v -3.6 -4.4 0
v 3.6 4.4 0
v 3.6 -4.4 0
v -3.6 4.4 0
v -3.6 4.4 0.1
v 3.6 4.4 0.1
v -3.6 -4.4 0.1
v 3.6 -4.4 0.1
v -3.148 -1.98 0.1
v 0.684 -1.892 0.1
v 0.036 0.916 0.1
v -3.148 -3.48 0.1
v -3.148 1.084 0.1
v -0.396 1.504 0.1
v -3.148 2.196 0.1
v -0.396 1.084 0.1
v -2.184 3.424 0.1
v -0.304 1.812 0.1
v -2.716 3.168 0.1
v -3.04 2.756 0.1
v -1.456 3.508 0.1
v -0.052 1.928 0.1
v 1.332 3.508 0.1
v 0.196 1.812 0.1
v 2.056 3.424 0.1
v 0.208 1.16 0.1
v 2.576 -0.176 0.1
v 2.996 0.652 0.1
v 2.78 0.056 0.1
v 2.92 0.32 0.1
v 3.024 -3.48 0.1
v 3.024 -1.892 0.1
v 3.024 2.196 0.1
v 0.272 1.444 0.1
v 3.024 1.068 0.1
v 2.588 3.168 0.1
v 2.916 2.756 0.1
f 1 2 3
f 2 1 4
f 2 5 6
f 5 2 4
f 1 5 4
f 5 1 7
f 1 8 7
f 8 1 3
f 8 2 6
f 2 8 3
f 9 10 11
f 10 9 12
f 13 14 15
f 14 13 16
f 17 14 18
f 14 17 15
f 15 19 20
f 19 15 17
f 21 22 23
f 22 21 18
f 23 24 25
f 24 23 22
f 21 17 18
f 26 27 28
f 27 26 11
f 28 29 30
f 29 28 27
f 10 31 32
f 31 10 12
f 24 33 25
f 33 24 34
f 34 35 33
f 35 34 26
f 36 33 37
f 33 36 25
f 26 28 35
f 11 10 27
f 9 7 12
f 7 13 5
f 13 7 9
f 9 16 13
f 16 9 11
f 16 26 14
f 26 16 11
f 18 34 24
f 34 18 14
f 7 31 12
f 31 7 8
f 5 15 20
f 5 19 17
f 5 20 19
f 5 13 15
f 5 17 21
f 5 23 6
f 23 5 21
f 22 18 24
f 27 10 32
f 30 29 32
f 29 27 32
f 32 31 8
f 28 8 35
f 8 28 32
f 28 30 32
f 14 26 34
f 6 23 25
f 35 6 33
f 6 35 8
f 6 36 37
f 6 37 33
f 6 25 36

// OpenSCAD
// file: ../p/box5-12.scad
use <../lib.scad>
function ldraw_lib__box5_12() = [
// 0 Box with 5 Faces without Any Edges
// 0 Name: box5-12.dat
// 0 Author: Chris Dee [cwdee]
// 0 !LDRAW_ORG Primitive UPDATE 2009-02
// 0 !LICENSE Licensed under CC BY 2.0 and CC BY 4.0 : see CAreadme.txt
// 
// 0 BFC CERTIFY CCW
  [0,"BFC","CERTIFY"],
  [0,"BFC","CCW"],
// 
// 0 !HISTORY 2009-09-03 [PTadmin] Official Update 2009-02
// 
// 
// 4 16 1 1 1 1 1 -1 -1 1 -1 -1 1 1
  [4,16,1,1,1,1,1,-1,-1,1,-1,-1,1,1],
// 4 16 -1 0 1 1 0 1 1 1 1 -1 1 1
  [4,16,-1,0,1,1,0,1,1,1,1,-1,1,1],
// 4 16 -1 0 -1 -1 0 1 -1 1 1 -1 1 -1
  [4,16,-1,0,-1,-1,0,1,-1,1,1,-1,1,-1],
// 4 16 1 0 -1 -1 0 -1 -1 1 -1 1 1 -1
  [4,16,1,0,-1,-1,0,-1,-1,1,-1,1,1,-1],
// 4 16 1 0 1 1 0 -1 1 1 -1 1 1 1
  [4,16,1,0,1,1,0,-1,1,1,-1,1,1,1],
// 0
];
module ldraw_lib__box5_12(step=0, col=false, unit=2/5, alt=false, line=0.2, solid=!$preview)
    makepoly(ldraw_lib__box5_12(), step=step, col=col, unit=unit, alt=alt, line=line, solid=solid);
ldraw_lib__box5_12(line=0.2);
// main file
use <../lib.scad>
use <../p/box5-12.scad>
function ldraw_lib__820673o() = [
// 0 Sticker  1.1 x  0.9 with Black Bold "2" on White Background
// 0 Name: 820673o.dat
// 0 Author: Takeshi Takahashi [RainbowDolphin]
// 0 !LDRAW_ORG Part UPDATE 2022-06
// 0 !LICENSE Licensed under CC BY 2.0 and CC BY 4.0 : see CAreadme.txt
// 
// 0 BFC CERTIFY CCW
  [0,"BFC","CERTIFY"],
  [0,"BFC","CCW"],
// 
// 0 !KEYWORDS Bricklink 6542stk01, Brickowl 602283, harbour, Pier
// 0 !KEYWORDS Rebrickable 820673, Seaport, Set 6542, wharf
// 
// 0 !HISTORY 2022-12-20 [PTadmin] Official Update 2022-06
// 
// 
// 1 16 0 -0.25 0 9 0 0 0 0.25 0 0 0 11 box5-12.dat
  [1,16,0,-0.25,0,9,0,0,0,0.25,0,0,0,11, ldraw_lib__box5_12()],
// 4 0 1.71 -0.25 -4.73 0.09 -0.25 2.29 -7.87 -0.25 -4.95 -7.87 -0.25 -8.7
  [4,0,1.71,-0.25,-4.73,0.09,-0.25,2.29,-7.87,-0.25,-4.95,-7.87,-0.25,-8.7],
// 4 0 -0.99 -0.25 3.76 -7.87 -0.25 5.49 -7.87 -0.25 2.71 -0.99 -0.25 2.71
  [4,0,-0.99,-0.25,3.76,-7.87,-0.25,5.49,-7.87,-0.25,2.71,-0.99,-0.25,2.71],
// 4 0 -0.99 -0.25 3.76 -0.76 -0.25 4.53 -5.46 -0.25 8.56 -7.87 -0.25 5.49
  [4,0,-0.99,-0.25,3.76,-0.76,-0.25,4.53,-5.46,-0.25,8.56,-7.87,-0.25,5.49],
// 4 0 -6.79 -0.25 7.92 -7.6 -0.25 6.89 -7.87 -0.25 5.49 -5.46 -0.25 8.56
  [4,0,-6.79,-0.25,7.92,-7.6,-0.25,6.89,-7.87,-0.25,5.49,-5.46,-0.25,8.56],
// 4 0 -0.13 -0.25 4.82 3.33 -0.25 8.77 -3.64 -0.25 8.77 -0.76 -0.25 4.53
  [4,0,-0.13,-0.25,4.82,3.33,-0.25,8.77,-3.64,-0.25,8.77,-0.76,-0.25,4.53],
// 4 0 3.33 -0.25 8.77 -0.13 -0.25 4.82 0.49 -0.25 4.53 5.14 -0.25 8.56
  [4,0,3.33,-0.25,8.77,-0.13,-0.25,4.82,0.49,-0.25,4.53,5.14,-0.25,8.56],
// 3 0 -3.64 -0.25 8.77 -5.46 -0.25 8.56 -0.76 -0.25 4.53
  [3,0,-3.64,-0.25,8.77,-5.46,-0.25,8.56,-0.76,-0.25,4.53],
// 4 0 0.52 -0.25 2.9 0.09 -0.25 2.29 6.44 -0.25 -0.44 7.49 -0.25 1.63
  [4,0,0.52,-0.25,2.9,0.09,-0.25,2.29,6.44,-0.25,-0.44,7.49,-0.25,1.63],
// 4 0 6.44 -0.25 -0.44 6.95 -0.25 0.14 7.3 -0.25 0.8 7.49 -0.25 1.63
  [4,0,6.44,-0.25,-0.44,6.95,-0.25,0.14,7.3,-0.25,0.8,7.49,-0.25,1.63],
// 4 0 7.56 -0.25 -8.7 7.56 -0.25 -4.73 1.71 -0.25 -4.73 -7.87 -0.25 -8.7
  [4,0,7.56,-0.25,-8.7,7.56,-0.25,-4.73,1.71,-0.25,-4.73,-7.87,-0.25,-8.7],
// 4 0 7.56 -0.25 5.49 5.14 -0.25 8.56 0.49 -0.25 4.53 0.68 -0.25 3.61
  [4,0,7.56,-0.25,5.49,5.14,-0.25,8.56,0.49,-0.25,4.53,0.68,-0.25,3.61],
// 4 0 0.68 -0.25 3.61 0.52 -0.25 2.9 7.56 -0.25 2.67 7.56 -0.25 5.49
  [4,0,0.68,-0.25,3.61,0.52,-0.25,2.9,7.56,-0.25,2.67,7.56,-0.25,5.49],
// 4 0 6.47 -0.25 7.92 5.14 -0.25 8.56 7.56 -0.25 5.49 7.29 -0.25 6.89
  [4,0,6.47,-0.25,7.92,5.14,-0.25,8.56,7.56,-0.25,5.49,7.29,-0.25,6.89],
// 3 0 0.52 -0.25 2.9 7.49 -0.25 1.63 7.56 -0.25 2.67
  [3,0,0.52,-0.25,2.9,7.49,-0.25,1.63,7.56,-0.25,2.67],
// 3 0 0.09 -0.25 2.29 1.71 -0.25 -4.73 6.44 -0.25 -0.44
  [3,0,0.09,-0.25,2.29,1.71,-0.25,-4.73,6.44,-0.25,-0.44],
// 3 15 -7.87 -0.25 -4.95 -9 -0.25 -11 -7.87 -0.25 -8.7
  [3,15,-7.87,-0.25,-4.95,-9,-0.25,-11,-7.87,-0.25,-8.7],
// 4 15 -9 -0.25 -11 -7.87 -0.25 -4.95 -7.87 -0.25 2.71 -9 -0.25 11
  [4,15,-9,-0.25,-11,-7.87,-0.25,-4.95,-7.87,-0.25,2.71,-9,-0.25,11],
// 4 15 -0.99 -0.25 2.71 -7.87 -0.25 2.71 -7.87 -0.25 -4.95 0.09 -0.25 2.29
  [4,15,-0.99,-0.25,2.71,-7.87,-0.25,2.71,-7.87,-0.25,-4.95,0.09,-0.25,2.29],
// 4 15 0.52 -0.25 2.9 -0.99 -0.25 3.76 -0.99 -0.25 2.71 0.09 -0.25 2.29
  [4,15,0.52,-0.25,2.9,-0.99,-0.25,3.76,-0.99,-0.25,2.71,0.09,-0.25,2.29],
// 4 15 0.68 -0.25 3.61 0.49 -0.25 4.53 -0.76 -0.25 4.53 -0.99 -0.25 3.76
  [4,15,0.68,-0.25,3.61,0.49,-0.25,4.53,-0.76,-0.25,4.53,-0.99,-0.25,3.76],
// 4 15 7.56 -0.25 -8.7 -7.87 -0.25 -8.7 -9 -0.25 -11 9 -0.25 -11
  [4,15,7.56,-0.25,-8.7,-7.87,-0.25,-8.7,-9,-0.25,-11,9,-0.25,-11],
// 3 15 -9 -0.25 11 -7.87 -0.25 5.49 -7.6 -0.25 6.89
  [3,15,-9,-0.25,11,-7.87,-0.25,5.49,-7.6,-0.25,6.89],
// 3 15 -9 -0.25 11 -6.79 -0.25 7.92 -5.46 -0.25 8.56
  [3,15,-9,-0.25,11,-6.79,-0.25,7.92,-5.46,-0.25,8.56],
// 3 15 -9 -0.25 11 -7.6 -0.25 6.89 -6.79 -0.25 7.92
  [3,15,-9,-0.25,11,-7.6,-0.25,6.89,-6.79,-0.25,7.92],
// 3 15 -9 -0.25 11 -7.87 -0.25 2.71 -7.87 -0.25 5.49
  [3,15,-9,-0.25,11,-7.87,-0.25,2.71,-7.87,-0.25,5.49],
// 3 15 -9 -0.25 11 -5.46 -0.25 8.56 -3.64 -0.25 8.77
  [3,15,-9,-0.25,11,-5.46,-0.25,8.56,-3.64,-0.25,8.77],
// 4 15 -9 -0.25 11 -3.64 -0.25 8.77 3.33 -0.25 8.77 9 -0.25 11
  [4,15,-9,-0.25,11,-3.64,-0.25,8.77,3.33,-0.25,8.77,9,-0.25,11],
// 3 15 -0.13 -0.25 4.82 -0.76 -0.25 4.53 0.49 -0.25 4.53
  [3,15,-0.13,-0.25,4.82,-0.76,-0.25,4.53,0.49,-0.25,4.53],
// 3 15 6.44 -0.25 -0.44 1.71 -0.25 -4.73 7.56 -0.25 -4.73
  [3,15,6.44,-0.25,-0.44,1.71,-0.25,-4.73,7.56,-0.25,-4.73],
// 3 15 7.3 -0.25 0.8 6.95 -0.25 0.14 7.56 -0.25 -4.73
  [3,15,7.3,-0.25,0.8,6.95,-0.25,0.14,7.56,-0.25,-4.73],
// 3 15 6.95 -0.25 0.14 6.44 -0.25 -0.44 7.56 -0.25 -4.73
  [3,15,6.95,-0.25,0.14,6.44,-0.25,-0.44,7.56,-0.25,-4.73],
// 3 15 7.56 -0.25 -4.73 7.56 -0.25 -8.7 9 -0.25 -11
  [3,15,7.56,-0.25,-4.73,7.56,-0.25,-8.7,9,-0.25,-11],
// 4 15 7.56 -0.25 2.67 7.49 -0.25 1.63 7.56 -0.25 -4.73 9 -0.25 -11
  [4,15,7.56,-0.25,2.67,7.49,-0.25,1.63,7.56,-0.25,-4.73,9,-0.25,-11],
// 3 15 7.49 -0.25 1.63 7.3 -0.25 0.8 7.56 -0.25 -4.73
  [3,15,7.49,-0.25,1.63,7.3,-0.25,0.8,7.56,-0.25,-4.73],
// 3 15 -0.99 -0.25 3.76 0.52 -0.25 2.9 0.68 -0.25 3.61
  [3,15,-0.99,-0.25,3.76,0.52,-0.25,2.9,0.68,-0.25,3.61],
// 3 15 9 -0.25 11 3.33 -0.25 8.77 5.14 -0.25 8.56
  [3,15,9,-0.25,11,3.33,-0.25,8.77,5.14,-0.25,8.56],
// 4 15 9 -0.25 11 7.56 -0.25 5.49 7.56 -0.25 2.67 9 -0.25 -11
  [4,15,9,-0.25,11,7.56,-0.25,5.49,7.56,-0.25,2.67,9,-0.25,-11],
// 3 15 9 -0.25 11 6.47 -0.25 7.92 7.29 -0.25 6.89
  [3,15,9,-0.25,11,6.47,-0.25,7.92,7.29,-0.25,6.89],
// 3 15 9 -0.25 11 7.29 -0.25 6.89 7.56 -0.25 5.49
  [3,15,9,-0.25,11,7.29,-0.25,6.89,7.56,-0.25,5.49],
// 3 15 9 -0.25 11 5.14 -0.25 8.56 6.47 -0.25 7.92
  [3,15,9,-0.25,11,5.14,-0.25,8.56,6.47,-0.25,7.92],
];
module ldraw_lib__820673o(step=0, col=false, unit=2/5, alt=false, line=0.2, solid=!$preview)
    makepoly(ldraw_lib__820673o(), step=step, col=col, unit=unit, alt=alt, line=line, solid=solid);
ldraw_lib__820673o(line=0.2);
